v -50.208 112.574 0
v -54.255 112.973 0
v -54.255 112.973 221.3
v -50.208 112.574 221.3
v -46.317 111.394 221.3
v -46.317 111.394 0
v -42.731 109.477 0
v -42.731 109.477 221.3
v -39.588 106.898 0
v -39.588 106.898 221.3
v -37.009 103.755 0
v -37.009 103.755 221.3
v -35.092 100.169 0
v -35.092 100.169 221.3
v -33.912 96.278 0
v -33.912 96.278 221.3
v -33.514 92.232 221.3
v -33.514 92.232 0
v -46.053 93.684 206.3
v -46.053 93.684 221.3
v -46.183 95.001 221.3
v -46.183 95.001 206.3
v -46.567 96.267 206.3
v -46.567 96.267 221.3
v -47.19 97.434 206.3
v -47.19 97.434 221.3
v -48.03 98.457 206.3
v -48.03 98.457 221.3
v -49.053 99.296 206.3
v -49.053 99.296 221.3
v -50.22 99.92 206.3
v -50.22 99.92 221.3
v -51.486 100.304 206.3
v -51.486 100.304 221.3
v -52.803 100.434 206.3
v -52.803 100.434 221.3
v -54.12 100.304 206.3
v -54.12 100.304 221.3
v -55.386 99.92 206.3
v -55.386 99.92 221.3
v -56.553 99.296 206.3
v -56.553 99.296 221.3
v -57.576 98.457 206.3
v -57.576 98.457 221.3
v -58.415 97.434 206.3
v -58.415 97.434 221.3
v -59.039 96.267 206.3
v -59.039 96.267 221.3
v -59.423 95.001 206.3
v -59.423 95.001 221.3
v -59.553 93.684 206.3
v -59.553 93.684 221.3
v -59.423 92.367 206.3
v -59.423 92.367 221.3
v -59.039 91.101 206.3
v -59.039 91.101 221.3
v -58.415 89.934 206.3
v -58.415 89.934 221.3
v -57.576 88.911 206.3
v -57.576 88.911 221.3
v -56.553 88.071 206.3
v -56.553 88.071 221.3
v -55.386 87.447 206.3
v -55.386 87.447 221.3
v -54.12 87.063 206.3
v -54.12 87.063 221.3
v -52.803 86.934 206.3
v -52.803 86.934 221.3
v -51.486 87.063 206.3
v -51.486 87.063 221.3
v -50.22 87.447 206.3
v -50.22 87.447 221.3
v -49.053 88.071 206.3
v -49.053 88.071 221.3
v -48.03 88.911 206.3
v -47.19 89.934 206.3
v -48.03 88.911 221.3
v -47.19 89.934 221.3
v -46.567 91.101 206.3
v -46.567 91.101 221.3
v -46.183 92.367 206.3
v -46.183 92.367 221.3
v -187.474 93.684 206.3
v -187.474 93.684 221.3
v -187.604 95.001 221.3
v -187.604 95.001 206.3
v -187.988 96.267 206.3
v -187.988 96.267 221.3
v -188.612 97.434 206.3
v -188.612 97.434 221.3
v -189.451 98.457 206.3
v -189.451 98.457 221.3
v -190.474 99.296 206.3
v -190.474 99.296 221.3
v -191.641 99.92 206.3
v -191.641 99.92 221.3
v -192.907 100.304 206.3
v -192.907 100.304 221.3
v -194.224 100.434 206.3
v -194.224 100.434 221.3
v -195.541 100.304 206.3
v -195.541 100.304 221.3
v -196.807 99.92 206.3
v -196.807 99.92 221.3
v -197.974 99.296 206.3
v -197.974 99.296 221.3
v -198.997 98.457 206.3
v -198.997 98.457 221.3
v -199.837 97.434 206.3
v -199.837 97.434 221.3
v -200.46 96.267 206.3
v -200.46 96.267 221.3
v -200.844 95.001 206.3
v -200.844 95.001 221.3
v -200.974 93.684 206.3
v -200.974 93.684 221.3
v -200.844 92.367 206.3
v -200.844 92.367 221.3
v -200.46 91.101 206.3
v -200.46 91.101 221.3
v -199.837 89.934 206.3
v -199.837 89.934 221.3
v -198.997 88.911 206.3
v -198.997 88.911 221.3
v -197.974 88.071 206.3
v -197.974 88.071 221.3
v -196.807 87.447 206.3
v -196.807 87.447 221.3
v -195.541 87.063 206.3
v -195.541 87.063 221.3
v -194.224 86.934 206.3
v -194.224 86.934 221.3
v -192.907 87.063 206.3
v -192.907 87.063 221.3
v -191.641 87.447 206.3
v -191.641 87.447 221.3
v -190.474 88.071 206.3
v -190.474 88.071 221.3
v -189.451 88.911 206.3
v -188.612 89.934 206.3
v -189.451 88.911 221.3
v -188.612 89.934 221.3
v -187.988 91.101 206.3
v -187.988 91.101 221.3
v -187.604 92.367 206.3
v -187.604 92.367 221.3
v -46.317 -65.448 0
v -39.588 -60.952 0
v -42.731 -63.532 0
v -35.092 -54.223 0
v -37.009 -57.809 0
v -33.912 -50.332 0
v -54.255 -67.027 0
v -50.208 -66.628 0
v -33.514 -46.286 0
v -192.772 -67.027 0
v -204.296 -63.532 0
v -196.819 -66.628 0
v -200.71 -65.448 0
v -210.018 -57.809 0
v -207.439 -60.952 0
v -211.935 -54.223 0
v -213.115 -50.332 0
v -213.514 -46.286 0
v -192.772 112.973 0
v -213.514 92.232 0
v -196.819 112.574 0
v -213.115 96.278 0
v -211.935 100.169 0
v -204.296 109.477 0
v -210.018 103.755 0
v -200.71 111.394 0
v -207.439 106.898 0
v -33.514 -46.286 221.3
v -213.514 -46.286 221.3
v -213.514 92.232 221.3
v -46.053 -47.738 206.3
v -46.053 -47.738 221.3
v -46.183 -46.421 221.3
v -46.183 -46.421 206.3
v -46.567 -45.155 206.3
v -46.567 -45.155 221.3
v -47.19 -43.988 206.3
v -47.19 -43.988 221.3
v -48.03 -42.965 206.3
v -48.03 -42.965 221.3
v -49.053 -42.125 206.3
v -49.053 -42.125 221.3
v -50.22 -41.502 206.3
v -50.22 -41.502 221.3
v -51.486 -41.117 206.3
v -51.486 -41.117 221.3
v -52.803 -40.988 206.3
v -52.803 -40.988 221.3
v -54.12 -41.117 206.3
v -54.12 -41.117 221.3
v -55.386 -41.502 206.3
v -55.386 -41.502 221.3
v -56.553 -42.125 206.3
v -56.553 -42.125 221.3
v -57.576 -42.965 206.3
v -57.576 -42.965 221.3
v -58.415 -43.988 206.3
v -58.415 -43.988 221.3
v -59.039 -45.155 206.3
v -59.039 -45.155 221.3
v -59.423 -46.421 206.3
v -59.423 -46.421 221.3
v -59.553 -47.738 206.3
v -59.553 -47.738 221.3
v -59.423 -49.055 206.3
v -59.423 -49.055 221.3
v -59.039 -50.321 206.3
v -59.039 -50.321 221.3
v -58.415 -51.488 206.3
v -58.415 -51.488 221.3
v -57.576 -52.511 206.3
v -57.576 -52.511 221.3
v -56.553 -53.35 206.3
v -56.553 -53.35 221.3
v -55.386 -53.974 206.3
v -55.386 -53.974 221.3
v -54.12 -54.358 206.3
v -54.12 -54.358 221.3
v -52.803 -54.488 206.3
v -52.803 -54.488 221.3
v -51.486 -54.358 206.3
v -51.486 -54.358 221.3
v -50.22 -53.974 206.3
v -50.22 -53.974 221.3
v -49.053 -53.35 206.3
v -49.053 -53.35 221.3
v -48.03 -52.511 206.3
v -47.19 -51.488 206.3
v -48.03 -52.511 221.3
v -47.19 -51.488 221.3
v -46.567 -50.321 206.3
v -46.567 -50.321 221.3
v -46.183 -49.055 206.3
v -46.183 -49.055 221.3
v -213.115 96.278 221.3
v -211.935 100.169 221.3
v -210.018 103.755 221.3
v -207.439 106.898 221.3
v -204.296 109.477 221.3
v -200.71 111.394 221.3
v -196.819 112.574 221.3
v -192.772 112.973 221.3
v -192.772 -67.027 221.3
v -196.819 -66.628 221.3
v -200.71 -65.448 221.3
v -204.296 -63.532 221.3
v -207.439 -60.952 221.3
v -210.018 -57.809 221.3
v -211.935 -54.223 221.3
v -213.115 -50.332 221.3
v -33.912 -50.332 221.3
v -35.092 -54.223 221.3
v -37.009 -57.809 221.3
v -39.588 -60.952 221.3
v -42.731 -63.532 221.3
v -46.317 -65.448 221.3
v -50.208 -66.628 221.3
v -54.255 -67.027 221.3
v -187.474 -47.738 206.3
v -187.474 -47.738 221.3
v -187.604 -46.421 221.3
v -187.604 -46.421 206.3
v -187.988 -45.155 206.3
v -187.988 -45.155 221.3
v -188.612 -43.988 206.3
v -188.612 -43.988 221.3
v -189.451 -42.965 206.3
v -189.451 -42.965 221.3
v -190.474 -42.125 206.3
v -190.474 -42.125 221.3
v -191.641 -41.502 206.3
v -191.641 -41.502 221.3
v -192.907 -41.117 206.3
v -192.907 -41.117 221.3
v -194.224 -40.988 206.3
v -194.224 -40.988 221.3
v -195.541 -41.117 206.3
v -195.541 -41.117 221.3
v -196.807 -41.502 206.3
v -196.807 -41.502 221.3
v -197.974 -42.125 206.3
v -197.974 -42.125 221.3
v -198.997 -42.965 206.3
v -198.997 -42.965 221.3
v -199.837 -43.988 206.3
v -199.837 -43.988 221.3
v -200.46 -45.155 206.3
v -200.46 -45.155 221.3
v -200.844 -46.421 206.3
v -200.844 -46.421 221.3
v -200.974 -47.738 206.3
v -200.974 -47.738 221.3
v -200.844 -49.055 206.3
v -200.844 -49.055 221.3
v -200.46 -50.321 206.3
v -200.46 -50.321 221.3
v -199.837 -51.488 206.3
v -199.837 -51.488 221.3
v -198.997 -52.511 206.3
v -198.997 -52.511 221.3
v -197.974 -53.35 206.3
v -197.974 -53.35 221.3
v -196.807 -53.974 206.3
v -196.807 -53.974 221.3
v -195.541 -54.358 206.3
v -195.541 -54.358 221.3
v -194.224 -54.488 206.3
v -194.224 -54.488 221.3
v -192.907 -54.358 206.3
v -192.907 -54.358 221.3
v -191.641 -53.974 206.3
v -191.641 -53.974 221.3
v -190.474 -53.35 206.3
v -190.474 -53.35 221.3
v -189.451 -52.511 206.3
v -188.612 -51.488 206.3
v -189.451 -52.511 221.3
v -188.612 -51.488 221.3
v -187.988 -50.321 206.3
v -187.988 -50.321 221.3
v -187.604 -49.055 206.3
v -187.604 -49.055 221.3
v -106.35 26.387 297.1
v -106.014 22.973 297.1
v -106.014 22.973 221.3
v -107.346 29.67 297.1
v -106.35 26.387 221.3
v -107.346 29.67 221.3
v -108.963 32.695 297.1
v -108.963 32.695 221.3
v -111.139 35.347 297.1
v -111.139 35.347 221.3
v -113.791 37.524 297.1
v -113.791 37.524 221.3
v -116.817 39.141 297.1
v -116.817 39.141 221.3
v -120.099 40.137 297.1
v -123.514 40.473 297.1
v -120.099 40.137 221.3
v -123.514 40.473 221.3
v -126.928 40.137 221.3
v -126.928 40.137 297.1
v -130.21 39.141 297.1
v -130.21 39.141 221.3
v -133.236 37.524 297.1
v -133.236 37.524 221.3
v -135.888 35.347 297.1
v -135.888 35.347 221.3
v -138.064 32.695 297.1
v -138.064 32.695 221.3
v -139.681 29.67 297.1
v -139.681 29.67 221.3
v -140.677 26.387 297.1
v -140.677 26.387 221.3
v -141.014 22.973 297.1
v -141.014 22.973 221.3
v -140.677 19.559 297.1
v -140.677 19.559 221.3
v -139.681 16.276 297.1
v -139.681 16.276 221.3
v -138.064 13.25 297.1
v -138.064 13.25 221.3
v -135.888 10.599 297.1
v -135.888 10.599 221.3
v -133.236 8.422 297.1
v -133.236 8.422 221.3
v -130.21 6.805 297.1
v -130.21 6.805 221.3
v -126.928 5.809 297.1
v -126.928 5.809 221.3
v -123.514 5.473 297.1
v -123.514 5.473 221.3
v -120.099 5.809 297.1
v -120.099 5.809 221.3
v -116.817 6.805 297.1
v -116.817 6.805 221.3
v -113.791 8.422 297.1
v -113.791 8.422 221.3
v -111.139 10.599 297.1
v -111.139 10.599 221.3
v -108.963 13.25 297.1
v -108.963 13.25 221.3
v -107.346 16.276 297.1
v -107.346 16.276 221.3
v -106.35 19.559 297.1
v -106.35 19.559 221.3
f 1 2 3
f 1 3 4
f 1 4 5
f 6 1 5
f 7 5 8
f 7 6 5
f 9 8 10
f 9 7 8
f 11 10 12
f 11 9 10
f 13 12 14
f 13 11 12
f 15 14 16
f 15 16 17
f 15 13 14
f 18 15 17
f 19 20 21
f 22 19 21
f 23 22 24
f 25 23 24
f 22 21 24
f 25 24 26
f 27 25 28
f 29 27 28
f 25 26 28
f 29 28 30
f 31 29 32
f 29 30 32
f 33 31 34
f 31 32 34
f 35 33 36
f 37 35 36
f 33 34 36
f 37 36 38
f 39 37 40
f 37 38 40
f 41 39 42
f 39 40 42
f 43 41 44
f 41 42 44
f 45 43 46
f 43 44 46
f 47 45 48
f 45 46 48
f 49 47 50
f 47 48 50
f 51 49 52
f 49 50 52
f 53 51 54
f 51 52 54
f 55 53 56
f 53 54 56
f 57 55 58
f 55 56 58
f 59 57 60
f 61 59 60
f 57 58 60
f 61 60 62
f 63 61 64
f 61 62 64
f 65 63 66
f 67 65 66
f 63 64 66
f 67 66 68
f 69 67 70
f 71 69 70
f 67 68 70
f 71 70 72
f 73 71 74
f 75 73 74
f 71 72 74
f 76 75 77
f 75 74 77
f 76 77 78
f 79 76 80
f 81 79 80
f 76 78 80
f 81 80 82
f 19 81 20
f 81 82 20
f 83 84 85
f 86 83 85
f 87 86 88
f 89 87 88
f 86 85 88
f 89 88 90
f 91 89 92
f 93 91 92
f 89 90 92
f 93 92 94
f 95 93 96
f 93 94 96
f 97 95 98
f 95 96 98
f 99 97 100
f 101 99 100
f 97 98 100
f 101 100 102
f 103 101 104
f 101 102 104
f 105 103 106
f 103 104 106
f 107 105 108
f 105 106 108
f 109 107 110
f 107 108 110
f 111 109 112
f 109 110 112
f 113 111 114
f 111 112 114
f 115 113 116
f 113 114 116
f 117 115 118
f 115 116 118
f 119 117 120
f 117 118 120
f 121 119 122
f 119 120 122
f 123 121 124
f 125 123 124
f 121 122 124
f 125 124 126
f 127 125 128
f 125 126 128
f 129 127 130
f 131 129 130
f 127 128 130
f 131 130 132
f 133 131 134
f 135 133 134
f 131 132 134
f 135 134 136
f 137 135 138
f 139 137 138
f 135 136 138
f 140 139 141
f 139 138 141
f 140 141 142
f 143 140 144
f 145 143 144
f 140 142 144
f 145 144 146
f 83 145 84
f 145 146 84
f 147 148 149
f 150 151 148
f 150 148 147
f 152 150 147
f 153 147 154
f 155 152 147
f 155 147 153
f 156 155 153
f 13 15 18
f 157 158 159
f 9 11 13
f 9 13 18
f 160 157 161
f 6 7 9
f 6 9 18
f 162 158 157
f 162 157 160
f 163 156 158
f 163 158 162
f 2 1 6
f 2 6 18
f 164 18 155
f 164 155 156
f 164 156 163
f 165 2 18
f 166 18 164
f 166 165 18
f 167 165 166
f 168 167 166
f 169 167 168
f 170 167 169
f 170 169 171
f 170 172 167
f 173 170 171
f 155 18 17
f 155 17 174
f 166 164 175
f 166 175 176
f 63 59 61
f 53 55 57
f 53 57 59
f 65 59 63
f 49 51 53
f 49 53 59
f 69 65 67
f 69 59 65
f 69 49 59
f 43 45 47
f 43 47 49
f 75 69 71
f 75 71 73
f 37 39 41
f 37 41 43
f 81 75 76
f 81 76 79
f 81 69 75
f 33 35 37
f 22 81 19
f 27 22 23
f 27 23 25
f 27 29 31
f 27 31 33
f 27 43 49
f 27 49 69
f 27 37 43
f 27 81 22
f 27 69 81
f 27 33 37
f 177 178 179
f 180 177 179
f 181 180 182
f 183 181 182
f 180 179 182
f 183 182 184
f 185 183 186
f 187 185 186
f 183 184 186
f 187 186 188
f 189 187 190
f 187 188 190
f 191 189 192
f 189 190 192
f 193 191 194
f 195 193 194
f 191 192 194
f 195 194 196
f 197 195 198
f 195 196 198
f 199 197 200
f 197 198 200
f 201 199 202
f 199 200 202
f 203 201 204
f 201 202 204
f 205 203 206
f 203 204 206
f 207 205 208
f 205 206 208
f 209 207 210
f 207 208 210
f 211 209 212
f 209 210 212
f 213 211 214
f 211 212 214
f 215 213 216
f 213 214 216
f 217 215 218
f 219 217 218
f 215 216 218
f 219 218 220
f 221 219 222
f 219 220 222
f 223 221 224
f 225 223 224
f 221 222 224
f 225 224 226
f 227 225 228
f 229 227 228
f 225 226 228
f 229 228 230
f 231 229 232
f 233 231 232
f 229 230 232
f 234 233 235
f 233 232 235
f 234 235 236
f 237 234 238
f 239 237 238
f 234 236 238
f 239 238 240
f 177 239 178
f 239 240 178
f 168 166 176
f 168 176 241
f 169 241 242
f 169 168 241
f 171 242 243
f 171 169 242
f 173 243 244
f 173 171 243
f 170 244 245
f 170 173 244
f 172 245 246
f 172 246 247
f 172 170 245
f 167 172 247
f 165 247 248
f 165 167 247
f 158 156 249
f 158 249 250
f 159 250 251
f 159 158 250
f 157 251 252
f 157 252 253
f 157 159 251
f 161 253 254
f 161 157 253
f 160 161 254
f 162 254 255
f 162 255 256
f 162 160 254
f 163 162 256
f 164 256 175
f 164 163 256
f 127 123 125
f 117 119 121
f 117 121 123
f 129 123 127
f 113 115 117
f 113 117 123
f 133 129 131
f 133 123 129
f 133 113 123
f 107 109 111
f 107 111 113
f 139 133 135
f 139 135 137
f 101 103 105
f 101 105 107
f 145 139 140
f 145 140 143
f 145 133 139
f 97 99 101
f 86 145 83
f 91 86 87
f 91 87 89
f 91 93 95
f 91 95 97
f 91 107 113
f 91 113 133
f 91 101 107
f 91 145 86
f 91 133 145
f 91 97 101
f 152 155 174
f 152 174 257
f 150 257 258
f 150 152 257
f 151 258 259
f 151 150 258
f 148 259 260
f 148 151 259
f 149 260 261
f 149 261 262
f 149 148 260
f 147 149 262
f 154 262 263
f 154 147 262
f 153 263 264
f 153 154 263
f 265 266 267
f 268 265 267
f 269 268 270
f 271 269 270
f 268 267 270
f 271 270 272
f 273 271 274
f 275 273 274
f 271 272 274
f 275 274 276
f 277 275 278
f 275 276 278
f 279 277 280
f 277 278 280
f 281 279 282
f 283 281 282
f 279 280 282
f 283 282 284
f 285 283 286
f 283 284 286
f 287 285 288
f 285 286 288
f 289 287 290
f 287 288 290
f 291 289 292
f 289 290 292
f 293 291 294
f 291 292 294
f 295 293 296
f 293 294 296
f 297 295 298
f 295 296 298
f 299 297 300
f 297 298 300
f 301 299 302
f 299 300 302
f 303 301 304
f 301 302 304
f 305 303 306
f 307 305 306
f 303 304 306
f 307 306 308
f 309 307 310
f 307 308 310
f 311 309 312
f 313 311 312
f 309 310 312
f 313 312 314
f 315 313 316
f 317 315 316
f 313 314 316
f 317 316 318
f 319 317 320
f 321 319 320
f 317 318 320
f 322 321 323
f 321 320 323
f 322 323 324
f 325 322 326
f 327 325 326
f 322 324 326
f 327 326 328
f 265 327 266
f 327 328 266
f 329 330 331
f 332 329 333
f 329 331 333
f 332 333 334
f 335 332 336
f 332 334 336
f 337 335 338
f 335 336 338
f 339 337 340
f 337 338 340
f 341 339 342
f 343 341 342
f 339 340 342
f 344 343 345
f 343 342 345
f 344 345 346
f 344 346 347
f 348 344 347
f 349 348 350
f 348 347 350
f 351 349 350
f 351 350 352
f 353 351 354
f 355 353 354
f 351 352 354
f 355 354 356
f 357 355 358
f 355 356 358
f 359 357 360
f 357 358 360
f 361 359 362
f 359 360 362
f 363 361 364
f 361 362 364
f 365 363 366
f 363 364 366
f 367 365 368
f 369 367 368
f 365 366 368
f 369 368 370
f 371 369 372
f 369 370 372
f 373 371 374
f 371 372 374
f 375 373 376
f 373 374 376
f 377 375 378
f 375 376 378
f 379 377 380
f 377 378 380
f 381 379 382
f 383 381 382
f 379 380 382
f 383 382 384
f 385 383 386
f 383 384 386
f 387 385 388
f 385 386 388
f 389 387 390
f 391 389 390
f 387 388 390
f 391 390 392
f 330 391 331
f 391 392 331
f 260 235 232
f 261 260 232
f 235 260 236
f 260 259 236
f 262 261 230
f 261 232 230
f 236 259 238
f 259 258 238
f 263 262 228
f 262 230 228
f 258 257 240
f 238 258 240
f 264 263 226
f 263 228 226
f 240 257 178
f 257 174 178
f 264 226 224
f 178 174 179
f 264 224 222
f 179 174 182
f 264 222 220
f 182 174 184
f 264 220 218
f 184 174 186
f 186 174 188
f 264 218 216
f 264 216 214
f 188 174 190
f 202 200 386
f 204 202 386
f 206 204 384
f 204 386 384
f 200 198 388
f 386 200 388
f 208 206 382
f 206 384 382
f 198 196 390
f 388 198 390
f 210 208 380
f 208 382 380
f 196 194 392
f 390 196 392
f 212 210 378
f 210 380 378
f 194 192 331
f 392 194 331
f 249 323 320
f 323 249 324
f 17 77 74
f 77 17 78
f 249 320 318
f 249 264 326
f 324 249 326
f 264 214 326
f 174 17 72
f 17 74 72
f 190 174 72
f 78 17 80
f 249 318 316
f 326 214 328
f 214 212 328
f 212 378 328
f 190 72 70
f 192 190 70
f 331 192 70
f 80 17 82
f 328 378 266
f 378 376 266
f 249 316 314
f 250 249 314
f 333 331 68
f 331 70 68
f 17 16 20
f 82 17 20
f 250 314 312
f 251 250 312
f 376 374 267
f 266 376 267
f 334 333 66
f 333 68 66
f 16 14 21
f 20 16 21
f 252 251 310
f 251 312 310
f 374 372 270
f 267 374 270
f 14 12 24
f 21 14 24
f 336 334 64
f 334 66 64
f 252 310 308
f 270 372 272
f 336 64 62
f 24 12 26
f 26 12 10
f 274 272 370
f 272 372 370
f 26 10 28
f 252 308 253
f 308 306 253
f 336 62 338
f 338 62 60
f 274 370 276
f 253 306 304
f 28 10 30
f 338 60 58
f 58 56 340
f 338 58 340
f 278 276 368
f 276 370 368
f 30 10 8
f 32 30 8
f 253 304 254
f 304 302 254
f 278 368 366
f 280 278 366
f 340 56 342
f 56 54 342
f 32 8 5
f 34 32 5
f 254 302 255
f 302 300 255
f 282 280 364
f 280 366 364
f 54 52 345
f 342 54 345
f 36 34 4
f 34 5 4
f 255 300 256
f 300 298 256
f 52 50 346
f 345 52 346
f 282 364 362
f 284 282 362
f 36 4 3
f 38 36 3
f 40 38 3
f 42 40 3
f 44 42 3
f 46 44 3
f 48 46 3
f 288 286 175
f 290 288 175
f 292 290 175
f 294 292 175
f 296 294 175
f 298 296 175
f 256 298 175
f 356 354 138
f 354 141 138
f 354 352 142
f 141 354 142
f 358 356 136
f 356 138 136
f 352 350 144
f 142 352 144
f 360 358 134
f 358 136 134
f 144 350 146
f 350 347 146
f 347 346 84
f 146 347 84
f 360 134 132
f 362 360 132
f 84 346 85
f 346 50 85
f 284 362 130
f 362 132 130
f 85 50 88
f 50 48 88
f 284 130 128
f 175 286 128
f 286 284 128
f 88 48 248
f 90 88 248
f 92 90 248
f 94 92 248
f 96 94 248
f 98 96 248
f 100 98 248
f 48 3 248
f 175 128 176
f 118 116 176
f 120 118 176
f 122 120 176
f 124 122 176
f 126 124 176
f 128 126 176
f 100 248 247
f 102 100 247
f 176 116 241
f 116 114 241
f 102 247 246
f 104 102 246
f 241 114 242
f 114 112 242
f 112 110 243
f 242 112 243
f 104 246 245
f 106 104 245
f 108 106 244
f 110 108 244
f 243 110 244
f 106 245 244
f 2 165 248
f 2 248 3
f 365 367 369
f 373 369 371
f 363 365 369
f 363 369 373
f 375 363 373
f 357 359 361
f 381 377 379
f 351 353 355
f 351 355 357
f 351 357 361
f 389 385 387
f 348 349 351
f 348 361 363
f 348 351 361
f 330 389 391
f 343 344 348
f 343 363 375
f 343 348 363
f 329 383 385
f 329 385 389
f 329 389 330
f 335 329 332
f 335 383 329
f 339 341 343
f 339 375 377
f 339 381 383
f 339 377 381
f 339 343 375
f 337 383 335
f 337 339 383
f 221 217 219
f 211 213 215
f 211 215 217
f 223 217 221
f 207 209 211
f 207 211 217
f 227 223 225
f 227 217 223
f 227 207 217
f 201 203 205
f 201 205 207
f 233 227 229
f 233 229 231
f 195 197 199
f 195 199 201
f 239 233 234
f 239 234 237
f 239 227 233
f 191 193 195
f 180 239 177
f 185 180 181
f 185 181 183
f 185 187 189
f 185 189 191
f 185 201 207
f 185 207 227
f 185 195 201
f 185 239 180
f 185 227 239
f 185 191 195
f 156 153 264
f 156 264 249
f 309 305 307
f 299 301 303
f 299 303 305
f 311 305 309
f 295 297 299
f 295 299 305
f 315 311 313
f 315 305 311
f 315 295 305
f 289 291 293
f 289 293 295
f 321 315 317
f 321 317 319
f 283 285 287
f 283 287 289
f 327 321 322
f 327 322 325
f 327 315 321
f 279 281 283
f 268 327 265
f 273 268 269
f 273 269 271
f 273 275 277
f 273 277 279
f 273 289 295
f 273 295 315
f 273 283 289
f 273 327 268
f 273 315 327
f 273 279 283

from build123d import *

# Parameters (mm, degrees)
EXTRUDE_1_DEPTH     = 221.3
SKETCH_2_R          = 17.5
EXTRUDE_2_DEPTH     = 75.8
SKETCH_3_R          = 6.75
CUT_EXTRUDE_1_DEPTH = 15


with BuildPart() as part:
    # 草图1 → 凸台-拉伸1 (new body)
    with BuildSketch(Plane.XY):
        with BuildLine():
            Line((-192.772466286, 112.972972973), (-54.254560741, 112.972972973))
            ThreePointArc((-54.254560741, 112.972972973), (-39.588425598, 106.898060889), (-33.513513514, 92.231925745))
            Line((-33.513513514, 92.231925745), (-33.513513514, -46.285979799))
            ThreePointArc((-33.513513514, -46.285979799), (-39.588425598, -60.952114943), (-54.254560741, -67.027027027))
            Line((-54.254560741, -67.027027027), (-192.772466286, -67.027027027))
            ThreePointArc((-192.772466286, -67.027027027), (-207.438601429, -60.952114943), (-213.513513514, -46.285979799))
            Line((-213.513513514, -46.285979799), (-213.513513514, 92.231925745))
            ThreePointArc((-213.513513514, 92.231925745), (-207.438601429, 106.898060889), (-192.772466286, 112.972972973))
        make_face()
    extrude(amount=EXTRUDE_1_DEPTH)

    # 草图2 → 凸台-拉伸2 (add)
    with BuildSketch(Plane.XY.offset(221.3)):
        with Locations((-123.513513514, 22.972972973)):
            Circle(SKETCH_2_R)
    extrude(amount=EXTRUDE_2_DEPTH)

    # 草图3 → 切除-拉伸1 (cut)
    with BuildSketch(Plane.XY.offset(221.3)):
        with Locations((-52.802835395, 93.683651092)):
            Circle(SKETCH_3_R)
        with Locations((-52.802835395, -47.737705146)):
            Circle(SKETCH_3_R)
        with Locations((-194.224191632, -47.737705146)):
            Circle(SKETCH_3_R)
        with Locations((-194.224191632, 93.683651092)):
            Circle(SKETCH_3_R)
    extrude(amount=-CUT_EXTRUDE_1_DEPTH, mode=Mode.SUBTRACT)


solid = part.part
